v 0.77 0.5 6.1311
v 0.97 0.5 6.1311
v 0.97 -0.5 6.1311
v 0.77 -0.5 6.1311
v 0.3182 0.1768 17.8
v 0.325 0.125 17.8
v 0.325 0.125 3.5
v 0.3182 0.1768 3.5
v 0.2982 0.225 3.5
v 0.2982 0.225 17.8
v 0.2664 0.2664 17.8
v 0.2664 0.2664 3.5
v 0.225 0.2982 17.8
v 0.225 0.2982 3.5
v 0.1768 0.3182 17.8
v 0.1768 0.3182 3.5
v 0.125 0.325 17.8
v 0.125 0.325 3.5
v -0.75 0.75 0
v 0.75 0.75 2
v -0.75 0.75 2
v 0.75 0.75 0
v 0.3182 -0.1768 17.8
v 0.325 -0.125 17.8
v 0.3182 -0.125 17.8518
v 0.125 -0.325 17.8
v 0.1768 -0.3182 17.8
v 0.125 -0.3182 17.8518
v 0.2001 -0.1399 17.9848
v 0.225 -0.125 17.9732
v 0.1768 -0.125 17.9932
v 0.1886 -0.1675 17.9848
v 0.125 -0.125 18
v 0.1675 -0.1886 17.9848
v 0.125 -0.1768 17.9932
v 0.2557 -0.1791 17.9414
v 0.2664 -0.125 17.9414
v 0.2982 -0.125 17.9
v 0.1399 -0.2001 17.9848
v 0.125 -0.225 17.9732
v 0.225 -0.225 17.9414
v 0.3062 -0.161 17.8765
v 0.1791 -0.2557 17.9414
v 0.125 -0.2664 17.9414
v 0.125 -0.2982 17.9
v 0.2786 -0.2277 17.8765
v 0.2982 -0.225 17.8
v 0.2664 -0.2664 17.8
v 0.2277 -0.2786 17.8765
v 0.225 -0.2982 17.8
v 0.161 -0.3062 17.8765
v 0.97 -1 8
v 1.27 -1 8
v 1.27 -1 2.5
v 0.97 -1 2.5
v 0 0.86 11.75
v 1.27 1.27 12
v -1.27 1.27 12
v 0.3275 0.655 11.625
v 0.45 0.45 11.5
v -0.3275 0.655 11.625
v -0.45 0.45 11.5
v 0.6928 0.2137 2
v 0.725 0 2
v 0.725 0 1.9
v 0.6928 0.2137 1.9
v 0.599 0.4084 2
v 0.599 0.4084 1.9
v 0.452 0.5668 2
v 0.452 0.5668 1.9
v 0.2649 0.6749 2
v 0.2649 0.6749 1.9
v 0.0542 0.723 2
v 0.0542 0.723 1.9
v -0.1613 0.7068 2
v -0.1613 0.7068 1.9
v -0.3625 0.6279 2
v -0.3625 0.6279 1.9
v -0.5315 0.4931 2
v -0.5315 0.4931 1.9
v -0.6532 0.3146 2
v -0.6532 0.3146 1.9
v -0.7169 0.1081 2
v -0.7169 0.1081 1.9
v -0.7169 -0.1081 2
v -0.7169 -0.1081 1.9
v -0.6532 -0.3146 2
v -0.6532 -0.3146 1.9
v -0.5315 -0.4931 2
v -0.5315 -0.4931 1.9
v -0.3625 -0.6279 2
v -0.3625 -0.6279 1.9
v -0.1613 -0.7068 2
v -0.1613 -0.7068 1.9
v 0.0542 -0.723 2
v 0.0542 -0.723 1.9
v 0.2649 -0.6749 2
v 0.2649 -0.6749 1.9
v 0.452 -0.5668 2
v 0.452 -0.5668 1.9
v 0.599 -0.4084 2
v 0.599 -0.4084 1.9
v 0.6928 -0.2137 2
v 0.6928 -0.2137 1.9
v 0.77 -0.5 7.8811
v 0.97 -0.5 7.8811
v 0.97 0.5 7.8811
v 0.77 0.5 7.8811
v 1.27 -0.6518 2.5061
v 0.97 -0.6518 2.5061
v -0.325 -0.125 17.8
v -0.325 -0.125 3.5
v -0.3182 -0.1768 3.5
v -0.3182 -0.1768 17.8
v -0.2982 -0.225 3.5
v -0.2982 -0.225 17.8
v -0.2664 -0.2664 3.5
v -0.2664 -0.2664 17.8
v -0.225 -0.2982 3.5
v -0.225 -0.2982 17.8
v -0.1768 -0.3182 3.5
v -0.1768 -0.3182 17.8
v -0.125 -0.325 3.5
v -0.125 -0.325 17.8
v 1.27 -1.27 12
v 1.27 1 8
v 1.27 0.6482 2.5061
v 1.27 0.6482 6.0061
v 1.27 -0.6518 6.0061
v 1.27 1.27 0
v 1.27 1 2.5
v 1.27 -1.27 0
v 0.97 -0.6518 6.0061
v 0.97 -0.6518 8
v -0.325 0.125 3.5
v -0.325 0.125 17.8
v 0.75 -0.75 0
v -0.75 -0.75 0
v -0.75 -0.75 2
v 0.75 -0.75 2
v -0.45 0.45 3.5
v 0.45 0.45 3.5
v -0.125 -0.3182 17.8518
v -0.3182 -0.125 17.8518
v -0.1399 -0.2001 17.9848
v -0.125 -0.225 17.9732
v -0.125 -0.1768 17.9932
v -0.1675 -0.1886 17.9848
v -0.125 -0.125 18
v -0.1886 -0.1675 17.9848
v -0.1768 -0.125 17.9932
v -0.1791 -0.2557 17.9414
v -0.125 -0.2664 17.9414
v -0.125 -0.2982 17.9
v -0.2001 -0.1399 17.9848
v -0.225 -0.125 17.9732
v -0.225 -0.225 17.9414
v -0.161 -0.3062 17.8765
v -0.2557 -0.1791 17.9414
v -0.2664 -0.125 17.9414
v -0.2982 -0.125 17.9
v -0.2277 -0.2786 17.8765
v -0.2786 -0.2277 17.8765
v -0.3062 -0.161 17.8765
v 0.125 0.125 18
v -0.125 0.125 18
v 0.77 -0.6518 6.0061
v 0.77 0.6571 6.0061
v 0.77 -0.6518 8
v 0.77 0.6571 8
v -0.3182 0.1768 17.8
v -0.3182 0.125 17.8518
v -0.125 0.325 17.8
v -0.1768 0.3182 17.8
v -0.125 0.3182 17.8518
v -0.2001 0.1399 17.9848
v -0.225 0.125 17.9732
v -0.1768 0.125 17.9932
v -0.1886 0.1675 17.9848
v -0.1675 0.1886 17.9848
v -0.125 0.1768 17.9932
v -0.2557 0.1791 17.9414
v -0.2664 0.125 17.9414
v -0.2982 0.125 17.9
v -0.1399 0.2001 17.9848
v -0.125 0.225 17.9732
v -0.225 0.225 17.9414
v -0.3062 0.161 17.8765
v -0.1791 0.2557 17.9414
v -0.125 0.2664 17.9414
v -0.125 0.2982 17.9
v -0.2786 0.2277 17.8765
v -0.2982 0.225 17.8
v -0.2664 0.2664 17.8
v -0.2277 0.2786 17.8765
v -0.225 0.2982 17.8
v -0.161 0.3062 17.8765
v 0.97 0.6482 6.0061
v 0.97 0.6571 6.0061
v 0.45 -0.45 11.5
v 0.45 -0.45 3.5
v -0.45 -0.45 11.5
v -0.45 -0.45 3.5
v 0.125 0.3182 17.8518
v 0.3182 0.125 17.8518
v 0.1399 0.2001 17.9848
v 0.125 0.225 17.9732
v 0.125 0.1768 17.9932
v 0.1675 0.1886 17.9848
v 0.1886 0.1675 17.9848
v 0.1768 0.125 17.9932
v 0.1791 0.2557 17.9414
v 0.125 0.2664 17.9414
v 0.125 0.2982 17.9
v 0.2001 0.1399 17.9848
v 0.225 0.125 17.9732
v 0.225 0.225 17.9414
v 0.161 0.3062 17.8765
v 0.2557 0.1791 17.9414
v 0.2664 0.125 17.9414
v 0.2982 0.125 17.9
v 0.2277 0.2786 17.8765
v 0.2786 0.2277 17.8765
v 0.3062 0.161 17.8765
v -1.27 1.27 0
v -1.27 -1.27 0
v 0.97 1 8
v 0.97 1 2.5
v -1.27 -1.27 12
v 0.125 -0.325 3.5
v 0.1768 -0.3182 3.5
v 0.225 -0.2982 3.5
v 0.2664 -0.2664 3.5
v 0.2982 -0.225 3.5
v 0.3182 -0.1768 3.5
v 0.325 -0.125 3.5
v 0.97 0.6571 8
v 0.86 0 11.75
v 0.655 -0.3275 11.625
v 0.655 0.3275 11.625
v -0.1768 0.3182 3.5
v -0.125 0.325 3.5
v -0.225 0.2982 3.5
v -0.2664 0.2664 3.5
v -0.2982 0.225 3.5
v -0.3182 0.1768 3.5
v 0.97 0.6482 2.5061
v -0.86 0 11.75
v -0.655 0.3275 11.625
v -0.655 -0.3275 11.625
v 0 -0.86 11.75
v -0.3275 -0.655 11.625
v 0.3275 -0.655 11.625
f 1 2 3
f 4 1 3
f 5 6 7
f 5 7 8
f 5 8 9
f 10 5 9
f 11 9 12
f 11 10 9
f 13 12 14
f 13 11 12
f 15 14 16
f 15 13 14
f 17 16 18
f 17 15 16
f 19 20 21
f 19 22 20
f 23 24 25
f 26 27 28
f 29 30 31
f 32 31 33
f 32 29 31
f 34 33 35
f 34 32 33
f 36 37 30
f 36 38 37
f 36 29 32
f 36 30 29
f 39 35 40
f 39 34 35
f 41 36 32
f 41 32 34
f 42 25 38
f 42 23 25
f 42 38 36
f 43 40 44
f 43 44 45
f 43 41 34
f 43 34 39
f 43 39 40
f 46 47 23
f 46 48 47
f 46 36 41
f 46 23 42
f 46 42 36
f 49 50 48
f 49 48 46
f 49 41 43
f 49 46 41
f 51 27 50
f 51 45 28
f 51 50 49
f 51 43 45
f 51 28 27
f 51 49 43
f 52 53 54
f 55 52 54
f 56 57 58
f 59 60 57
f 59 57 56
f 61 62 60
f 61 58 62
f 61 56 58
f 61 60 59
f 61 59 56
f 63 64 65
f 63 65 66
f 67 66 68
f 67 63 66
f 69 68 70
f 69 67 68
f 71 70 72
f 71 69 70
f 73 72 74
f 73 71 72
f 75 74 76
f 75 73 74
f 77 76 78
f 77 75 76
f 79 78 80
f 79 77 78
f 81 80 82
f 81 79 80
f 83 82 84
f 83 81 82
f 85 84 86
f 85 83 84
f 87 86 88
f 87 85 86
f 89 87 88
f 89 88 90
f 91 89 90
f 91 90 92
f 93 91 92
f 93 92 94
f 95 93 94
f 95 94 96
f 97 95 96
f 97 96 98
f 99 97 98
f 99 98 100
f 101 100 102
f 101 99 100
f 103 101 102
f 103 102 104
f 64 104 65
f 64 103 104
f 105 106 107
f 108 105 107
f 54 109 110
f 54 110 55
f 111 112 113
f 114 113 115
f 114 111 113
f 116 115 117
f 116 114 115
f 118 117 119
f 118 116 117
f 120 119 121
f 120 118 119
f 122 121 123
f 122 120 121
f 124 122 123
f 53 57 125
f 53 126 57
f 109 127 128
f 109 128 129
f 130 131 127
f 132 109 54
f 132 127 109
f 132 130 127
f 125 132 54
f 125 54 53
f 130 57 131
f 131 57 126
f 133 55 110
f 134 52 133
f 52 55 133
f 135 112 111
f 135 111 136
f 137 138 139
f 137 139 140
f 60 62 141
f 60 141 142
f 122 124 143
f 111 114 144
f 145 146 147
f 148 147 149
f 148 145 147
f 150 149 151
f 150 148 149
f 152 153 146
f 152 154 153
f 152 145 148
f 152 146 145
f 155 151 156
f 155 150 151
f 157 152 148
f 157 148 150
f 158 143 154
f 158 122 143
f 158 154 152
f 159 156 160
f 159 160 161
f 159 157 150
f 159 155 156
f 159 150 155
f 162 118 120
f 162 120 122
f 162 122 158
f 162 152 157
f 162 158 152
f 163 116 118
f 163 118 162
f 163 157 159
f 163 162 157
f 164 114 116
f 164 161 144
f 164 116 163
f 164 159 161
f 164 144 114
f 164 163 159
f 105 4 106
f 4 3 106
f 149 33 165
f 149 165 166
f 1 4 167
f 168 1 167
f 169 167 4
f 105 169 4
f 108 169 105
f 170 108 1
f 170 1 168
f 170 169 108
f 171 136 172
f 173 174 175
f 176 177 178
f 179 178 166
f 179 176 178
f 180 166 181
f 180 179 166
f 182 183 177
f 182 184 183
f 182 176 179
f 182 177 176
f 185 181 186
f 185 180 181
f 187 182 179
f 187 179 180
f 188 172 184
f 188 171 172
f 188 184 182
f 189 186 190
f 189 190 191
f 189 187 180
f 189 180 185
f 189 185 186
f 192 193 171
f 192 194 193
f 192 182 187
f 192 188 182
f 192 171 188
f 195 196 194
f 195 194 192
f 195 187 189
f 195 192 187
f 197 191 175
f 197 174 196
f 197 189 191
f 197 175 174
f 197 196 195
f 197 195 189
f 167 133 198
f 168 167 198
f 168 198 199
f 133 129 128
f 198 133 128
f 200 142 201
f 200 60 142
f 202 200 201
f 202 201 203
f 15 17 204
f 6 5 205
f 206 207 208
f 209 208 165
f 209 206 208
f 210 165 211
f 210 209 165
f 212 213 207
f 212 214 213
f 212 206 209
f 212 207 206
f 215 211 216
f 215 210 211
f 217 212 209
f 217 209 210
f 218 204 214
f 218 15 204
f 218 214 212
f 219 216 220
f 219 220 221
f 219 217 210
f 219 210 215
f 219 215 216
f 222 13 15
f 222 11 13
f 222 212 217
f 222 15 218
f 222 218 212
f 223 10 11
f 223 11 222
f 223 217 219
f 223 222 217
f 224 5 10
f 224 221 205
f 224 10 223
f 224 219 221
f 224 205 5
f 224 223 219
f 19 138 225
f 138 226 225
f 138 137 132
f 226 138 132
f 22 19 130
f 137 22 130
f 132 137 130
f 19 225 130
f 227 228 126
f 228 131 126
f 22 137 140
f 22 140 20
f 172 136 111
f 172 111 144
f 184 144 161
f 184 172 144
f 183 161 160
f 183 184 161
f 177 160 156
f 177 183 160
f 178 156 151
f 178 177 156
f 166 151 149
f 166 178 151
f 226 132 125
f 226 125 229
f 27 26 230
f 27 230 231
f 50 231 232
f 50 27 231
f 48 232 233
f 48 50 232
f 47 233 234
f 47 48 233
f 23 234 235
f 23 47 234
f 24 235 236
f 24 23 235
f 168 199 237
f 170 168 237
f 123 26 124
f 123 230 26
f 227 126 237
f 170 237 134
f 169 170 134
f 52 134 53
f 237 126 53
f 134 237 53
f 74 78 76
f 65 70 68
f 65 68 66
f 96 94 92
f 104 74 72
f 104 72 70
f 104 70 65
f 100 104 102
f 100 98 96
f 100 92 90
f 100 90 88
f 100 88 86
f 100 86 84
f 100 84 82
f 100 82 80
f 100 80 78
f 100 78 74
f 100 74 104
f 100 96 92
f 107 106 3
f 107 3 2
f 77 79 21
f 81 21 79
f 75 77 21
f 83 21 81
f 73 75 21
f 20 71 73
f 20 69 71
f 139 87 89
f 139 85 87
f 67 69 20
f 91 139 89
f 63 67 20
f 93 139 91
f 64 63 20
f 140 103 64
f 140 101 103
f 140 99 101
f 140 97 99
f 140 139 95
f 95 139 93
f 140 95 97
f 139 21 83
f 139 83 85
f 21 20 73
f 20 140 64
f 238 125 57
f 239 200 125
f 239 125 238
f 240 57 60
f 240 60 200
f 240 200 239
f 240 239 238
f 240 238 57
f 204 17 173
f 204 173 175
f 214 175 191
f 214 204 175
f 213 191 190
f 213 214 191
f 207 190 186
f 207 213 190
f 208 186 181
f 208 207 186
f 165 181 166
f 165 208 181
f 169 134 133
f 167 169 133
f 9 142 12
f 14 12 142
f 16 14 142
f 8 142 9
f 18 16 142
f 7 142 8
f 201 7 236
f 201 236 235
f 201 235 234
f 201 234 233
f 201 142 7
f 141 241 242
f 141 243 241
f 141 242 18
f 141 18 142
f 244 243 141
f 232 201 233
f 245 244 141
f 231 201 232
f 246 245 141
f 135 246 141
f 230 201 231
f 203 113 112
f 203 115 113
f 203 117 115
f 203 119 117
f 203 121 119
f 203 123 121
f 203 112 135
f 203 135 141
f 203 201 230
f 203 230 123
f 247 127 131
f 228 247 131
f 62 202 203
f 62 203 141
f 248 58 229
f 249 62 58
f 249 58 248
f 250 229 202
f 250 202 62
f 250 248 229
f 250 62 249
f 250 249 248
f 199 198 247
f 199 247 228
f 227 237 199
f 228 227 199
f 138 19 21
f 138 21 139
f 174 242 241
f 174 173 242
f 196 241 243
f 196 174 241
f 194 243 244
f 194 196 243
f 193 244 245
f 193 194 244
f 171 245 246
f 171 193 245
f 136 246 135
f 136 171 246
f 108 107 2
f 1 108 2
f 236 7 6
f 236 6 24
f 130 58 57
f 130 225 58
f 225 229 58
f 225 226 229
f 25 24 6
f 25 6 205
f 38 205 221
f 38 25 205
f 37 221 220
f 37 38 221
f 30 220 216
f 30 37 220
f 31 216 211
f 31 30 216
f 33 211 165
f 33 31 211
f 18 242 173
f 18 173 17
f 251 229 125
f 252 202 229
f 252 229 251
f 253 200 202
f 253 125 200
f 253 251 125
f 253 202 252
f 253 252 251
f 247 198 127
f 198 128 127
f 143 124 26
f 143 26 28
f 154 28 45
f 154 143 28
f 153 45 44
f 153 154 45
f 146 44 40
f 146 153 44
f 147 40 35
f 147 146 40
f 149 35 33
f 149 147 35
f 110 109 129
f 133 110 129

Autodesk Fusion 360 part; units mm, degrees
sketch "Sketch1" plane through (0, 0, 0) normal (0, 0, 1) x (1, 0, 0)
  line L0 (1.27, -1.27) -> (-1.27, -1.27)
  line L1 (-1.27, -1.27) -> (-1.27, 1.27)
  line L2 (-1.27, 1.27) -> (1.27, 1.27)
  line L3 (1.27, 1.27) -> (1.27, -1.27)
  line L4 (1.27, -1.27) -> (-1.27, 1.27) construction
  line L5 (-1.27, -1.27) -> (1.27, 1.27) construction
  dimension "d1" = 2.54
  dimension "d2" = 2.54
extrude "Extrude1" add sketch "Sketch1" along normal blind 12
sketch "Sketch2" plane through (0, 0, 12) normal (0, 0, 1) x (-1, 0, 0)
  line L0 (-1.27, -1.27) -> (1.27, -1.27)
  line L1 (1.27, -1.27) -> (1.27, 1.27)
  line L2 (1.27, 1.27) -> (-1.27, 1.27)
  line L3 (-1.27, 1.27) -> (-1.27, -1.27)
  line L4 (-0.45, 0.45) -> (0.45, 0.45)
  line L5 (0.45, 0.45) -> (0.45, -0.45)
  line L6 (0.45, -0.45) -> (-0.45, -0.45)
  line L7 (-0.45, -0.45) -> (-0.45, 0.45)
  line L8 (-0.45, 0.45) -> (0.45, -0.45) construction
  line L9 (0.45, 0.45) -> (-0.45, -0.45) construction
  dimension "d5" = 0.9
  dimension "d6" = 0.9
extrude "Extrude2" cut sketch "Sketch2" against normal blind 0.5 contours L4 L5 L6 L7
loft "Loft1" cut profiles "Sketch2" section 1 section 2 face at (0.15, -0.15, 11.5)
extrude "Extrude3" cut 1 faces at (0.15, -0.15, 11.5) along direction (0, 0, -1) blind 8
sketch "Sketch3" plane through (1.27, 0, 0) normal (1, 0, 0) x (0, 1, 0)
  line L0 (-1.27, 0) -> (1.27, 0)
  line L1 (1.27, 0) -> (1.27, 12)
  line L2 (1.27, 12) -> (-1.27, 12)
  line L3 (-1.27, 12) -> (-1.27, 0)
  line L4 (1, 8) -> (-1, 8)
  line L5 (-1, 8) -> (-1, 2.5)
  line L6 (-1, 2.5) -> (1, 2.5)
  line L7 (1, 2.5) -> (1, 8)
  line L8 (1, 8) -> (-1, 2.5) construction
  line L9 (-1, 8) -> (1, 2.5) construction
  line L10 (0.6482, 2.5061) -> (-0.6518, 2.5061)
  line L11 (-0.6518, 2.5061) -> (-0.6518, 6.0061)
  line L12 (-0.6518, 6.0061) -> (0.6482, 6.0061)
  line L13 (0.6482, 6.0061) -> (0.6482, 2.5061)
  line L14 (0.6482, 2.5061) -> (-0.6518, 6.0061) construction
  line L15 (-0.6518, 2.5061) -> (0.6482, 6.0061) construction
  line L16 (-0.6518, 6.0061) -> (0.6571, 6.0061)
  line L17 (0.6571, 6.0061) -> (0.6571, 8.0061)
  line L18 (0.6571, 8.0061) -> (-0.6518, 8.0061)
  line L19 (-0.6518, 8.0061) -> (-0.6518, 6.0061)
  line L20 (0.5, 6.1311) -> (-0.5, 6.1311)
  line L21 (-0.5, 6.1311) -> (-0.5, 7.8811)
  line L22 (-0.5, 7.8811) -> (0.5, 7.8811)
  line L23 (0.5, 7.8811) -> (0.5, 6.1311)
  line L24 (0.5, 6.1311) -> (-0.5, 7.8811) construction
  line L25 (-0.5, 6.1311) -> (0.5, 7.8811) construction
  line L26 (-1.27, 6) -> (-0.6518, 6.0061)
  line L27 (0.6571, 6.0061) -> (1.27, 6)
  line L28 (0.6482, 2.5061) -> (1, 2.5)
  line L29 (-0.6518, 2.5061) -> (-1, 2.5)
  point P0 (0, 5.25)
  point P1 (-0.0018, 4.2561)
  point P2 (0, 7.0061)
  dimension "d11" = 5.5
  dimension "d12" = 2.5
  dimension "d13" = 1.3
  dimension "d14" = 3.5
  dimension "d15" = 2
  dimension "d16" = 1
  dimension "d17" = 1.75
  dimension "d31" = 0.125
extrude "Extrude4" cut sketch "Sketch3" against normal blind 0.3 contours L5 L11 L26 L29 | L4 L5 L19 L26 | L4 L7 L17 L27 | L7 L13 L16 L27 L28
extrude "Extrude5" cut sketch "Sketch3" against normal blind 0.5 contours L4 L12 L16 L17 L19
extrude "Extrude6" cut sketch "Sketch3" against normal blind 0.3 contours L20 L21 L22 L23
sketch "Sketch4" plane through (0, 0, 0) normal (0, 0, -1) x (1, 0, 0)
  line L0 (-1.27, -1.27) -> (1.27, -1.27)
  line L1 (1.27, -1.27) -> (1.27, 1.27)
  line L2 (1.27, 1.27) -> (-1.27, 1.27)
  line L3 (-1.27, 1.27) -> (-1.27, -1.27)
  line L4 (0.75, -0.75) -> (-0.75, -0.75)
  line L5 (-0.75, -0.75) -> (-0.75, 0.75)
  line L6 (-0.75, 0.75) -> (0.75, 0.75)
  line L7 (0.75, 0.75) -> (0.75, -0.75)
  line L8 (0.75, -0.75) -> (-0.75, 0.75) construction
  line L9 (-0.75, -0.75) -> (0.75, 0.75) construction
  dimension "d24" = 1.5
  dimension "d25" = 1.5
extrude "Extrude7" cut sketch "Sketch4" against normal blind 2 contours L4 L5 L6 L7
sketch "Sketch5" plane through (0, 0, 2) normal (0, 0, -1) x (1, 0, 0)
  line L0 (0.75, 0.75) -> (-0.75, 0.75)
  line L1 (-0.75, 0.75) -> (-0.75, -0.75)
  line L2 (-0.75, -0.75) -> (0.75, -0.75)
  line L3 (0.75, -0.75) -> (0.75, 0.75)
  circle A0 centre (0, 0) radius 0.725
  dimension "d28" = 1.45
extrude "Extrude8" add sketch "Sketch5" along normal blind 0.1 contours A0
sketch "Sketch6" plane through (0, 0, 3.5) normal (0, 0, 1) x (-1, 0, 0)
  line L0 (-0.45, -0.45) -> (0.45, -0.45)
  line L1 (0.45, -0.45) -> (0.45, 0.45)
  line L2 (0.45, 0.45) -> (-0.45, 0.45)
  line L3 (-0.45, 0.45) -> (-0.45, -0.45)
  line L4 (-0.325, 0.325) -> (0.325, 0.325)
  line L5 (0.325, 0.325) -> (0.325, -0.325)
  line L6 (0.325, -0.325) -> (-0.325, -0.325)
  line L7 (-0.325, -0.325) -> (-0.325, 0.325)
  line L8 (-0.325, 0.325) -> (0.325, -0.325) construction
  line L9 (0.325, 0.325) -> (-0.325, -0.325) construction
  dimension "d32" = 0.65
  dimension "d33" = 0.65
extrude "Extrude9" add sketch "Sketch6" along normal blind 14.5 contours L4 L5 L6 L7
fillet "Fillet1" radius 0.2 8 edges at (0.325, -0.325, 10.75) (-0.325, -0.325, 10.75) (0.325, 0.325, 10.75) (-0.325, 0.325, 10.75) (-0.325, 0, 18) (0, 0.325, 18) (0.325, 0, 18) (0, -0.325, 18)
equation "d34 = 8.50 mm + 6 mm"
